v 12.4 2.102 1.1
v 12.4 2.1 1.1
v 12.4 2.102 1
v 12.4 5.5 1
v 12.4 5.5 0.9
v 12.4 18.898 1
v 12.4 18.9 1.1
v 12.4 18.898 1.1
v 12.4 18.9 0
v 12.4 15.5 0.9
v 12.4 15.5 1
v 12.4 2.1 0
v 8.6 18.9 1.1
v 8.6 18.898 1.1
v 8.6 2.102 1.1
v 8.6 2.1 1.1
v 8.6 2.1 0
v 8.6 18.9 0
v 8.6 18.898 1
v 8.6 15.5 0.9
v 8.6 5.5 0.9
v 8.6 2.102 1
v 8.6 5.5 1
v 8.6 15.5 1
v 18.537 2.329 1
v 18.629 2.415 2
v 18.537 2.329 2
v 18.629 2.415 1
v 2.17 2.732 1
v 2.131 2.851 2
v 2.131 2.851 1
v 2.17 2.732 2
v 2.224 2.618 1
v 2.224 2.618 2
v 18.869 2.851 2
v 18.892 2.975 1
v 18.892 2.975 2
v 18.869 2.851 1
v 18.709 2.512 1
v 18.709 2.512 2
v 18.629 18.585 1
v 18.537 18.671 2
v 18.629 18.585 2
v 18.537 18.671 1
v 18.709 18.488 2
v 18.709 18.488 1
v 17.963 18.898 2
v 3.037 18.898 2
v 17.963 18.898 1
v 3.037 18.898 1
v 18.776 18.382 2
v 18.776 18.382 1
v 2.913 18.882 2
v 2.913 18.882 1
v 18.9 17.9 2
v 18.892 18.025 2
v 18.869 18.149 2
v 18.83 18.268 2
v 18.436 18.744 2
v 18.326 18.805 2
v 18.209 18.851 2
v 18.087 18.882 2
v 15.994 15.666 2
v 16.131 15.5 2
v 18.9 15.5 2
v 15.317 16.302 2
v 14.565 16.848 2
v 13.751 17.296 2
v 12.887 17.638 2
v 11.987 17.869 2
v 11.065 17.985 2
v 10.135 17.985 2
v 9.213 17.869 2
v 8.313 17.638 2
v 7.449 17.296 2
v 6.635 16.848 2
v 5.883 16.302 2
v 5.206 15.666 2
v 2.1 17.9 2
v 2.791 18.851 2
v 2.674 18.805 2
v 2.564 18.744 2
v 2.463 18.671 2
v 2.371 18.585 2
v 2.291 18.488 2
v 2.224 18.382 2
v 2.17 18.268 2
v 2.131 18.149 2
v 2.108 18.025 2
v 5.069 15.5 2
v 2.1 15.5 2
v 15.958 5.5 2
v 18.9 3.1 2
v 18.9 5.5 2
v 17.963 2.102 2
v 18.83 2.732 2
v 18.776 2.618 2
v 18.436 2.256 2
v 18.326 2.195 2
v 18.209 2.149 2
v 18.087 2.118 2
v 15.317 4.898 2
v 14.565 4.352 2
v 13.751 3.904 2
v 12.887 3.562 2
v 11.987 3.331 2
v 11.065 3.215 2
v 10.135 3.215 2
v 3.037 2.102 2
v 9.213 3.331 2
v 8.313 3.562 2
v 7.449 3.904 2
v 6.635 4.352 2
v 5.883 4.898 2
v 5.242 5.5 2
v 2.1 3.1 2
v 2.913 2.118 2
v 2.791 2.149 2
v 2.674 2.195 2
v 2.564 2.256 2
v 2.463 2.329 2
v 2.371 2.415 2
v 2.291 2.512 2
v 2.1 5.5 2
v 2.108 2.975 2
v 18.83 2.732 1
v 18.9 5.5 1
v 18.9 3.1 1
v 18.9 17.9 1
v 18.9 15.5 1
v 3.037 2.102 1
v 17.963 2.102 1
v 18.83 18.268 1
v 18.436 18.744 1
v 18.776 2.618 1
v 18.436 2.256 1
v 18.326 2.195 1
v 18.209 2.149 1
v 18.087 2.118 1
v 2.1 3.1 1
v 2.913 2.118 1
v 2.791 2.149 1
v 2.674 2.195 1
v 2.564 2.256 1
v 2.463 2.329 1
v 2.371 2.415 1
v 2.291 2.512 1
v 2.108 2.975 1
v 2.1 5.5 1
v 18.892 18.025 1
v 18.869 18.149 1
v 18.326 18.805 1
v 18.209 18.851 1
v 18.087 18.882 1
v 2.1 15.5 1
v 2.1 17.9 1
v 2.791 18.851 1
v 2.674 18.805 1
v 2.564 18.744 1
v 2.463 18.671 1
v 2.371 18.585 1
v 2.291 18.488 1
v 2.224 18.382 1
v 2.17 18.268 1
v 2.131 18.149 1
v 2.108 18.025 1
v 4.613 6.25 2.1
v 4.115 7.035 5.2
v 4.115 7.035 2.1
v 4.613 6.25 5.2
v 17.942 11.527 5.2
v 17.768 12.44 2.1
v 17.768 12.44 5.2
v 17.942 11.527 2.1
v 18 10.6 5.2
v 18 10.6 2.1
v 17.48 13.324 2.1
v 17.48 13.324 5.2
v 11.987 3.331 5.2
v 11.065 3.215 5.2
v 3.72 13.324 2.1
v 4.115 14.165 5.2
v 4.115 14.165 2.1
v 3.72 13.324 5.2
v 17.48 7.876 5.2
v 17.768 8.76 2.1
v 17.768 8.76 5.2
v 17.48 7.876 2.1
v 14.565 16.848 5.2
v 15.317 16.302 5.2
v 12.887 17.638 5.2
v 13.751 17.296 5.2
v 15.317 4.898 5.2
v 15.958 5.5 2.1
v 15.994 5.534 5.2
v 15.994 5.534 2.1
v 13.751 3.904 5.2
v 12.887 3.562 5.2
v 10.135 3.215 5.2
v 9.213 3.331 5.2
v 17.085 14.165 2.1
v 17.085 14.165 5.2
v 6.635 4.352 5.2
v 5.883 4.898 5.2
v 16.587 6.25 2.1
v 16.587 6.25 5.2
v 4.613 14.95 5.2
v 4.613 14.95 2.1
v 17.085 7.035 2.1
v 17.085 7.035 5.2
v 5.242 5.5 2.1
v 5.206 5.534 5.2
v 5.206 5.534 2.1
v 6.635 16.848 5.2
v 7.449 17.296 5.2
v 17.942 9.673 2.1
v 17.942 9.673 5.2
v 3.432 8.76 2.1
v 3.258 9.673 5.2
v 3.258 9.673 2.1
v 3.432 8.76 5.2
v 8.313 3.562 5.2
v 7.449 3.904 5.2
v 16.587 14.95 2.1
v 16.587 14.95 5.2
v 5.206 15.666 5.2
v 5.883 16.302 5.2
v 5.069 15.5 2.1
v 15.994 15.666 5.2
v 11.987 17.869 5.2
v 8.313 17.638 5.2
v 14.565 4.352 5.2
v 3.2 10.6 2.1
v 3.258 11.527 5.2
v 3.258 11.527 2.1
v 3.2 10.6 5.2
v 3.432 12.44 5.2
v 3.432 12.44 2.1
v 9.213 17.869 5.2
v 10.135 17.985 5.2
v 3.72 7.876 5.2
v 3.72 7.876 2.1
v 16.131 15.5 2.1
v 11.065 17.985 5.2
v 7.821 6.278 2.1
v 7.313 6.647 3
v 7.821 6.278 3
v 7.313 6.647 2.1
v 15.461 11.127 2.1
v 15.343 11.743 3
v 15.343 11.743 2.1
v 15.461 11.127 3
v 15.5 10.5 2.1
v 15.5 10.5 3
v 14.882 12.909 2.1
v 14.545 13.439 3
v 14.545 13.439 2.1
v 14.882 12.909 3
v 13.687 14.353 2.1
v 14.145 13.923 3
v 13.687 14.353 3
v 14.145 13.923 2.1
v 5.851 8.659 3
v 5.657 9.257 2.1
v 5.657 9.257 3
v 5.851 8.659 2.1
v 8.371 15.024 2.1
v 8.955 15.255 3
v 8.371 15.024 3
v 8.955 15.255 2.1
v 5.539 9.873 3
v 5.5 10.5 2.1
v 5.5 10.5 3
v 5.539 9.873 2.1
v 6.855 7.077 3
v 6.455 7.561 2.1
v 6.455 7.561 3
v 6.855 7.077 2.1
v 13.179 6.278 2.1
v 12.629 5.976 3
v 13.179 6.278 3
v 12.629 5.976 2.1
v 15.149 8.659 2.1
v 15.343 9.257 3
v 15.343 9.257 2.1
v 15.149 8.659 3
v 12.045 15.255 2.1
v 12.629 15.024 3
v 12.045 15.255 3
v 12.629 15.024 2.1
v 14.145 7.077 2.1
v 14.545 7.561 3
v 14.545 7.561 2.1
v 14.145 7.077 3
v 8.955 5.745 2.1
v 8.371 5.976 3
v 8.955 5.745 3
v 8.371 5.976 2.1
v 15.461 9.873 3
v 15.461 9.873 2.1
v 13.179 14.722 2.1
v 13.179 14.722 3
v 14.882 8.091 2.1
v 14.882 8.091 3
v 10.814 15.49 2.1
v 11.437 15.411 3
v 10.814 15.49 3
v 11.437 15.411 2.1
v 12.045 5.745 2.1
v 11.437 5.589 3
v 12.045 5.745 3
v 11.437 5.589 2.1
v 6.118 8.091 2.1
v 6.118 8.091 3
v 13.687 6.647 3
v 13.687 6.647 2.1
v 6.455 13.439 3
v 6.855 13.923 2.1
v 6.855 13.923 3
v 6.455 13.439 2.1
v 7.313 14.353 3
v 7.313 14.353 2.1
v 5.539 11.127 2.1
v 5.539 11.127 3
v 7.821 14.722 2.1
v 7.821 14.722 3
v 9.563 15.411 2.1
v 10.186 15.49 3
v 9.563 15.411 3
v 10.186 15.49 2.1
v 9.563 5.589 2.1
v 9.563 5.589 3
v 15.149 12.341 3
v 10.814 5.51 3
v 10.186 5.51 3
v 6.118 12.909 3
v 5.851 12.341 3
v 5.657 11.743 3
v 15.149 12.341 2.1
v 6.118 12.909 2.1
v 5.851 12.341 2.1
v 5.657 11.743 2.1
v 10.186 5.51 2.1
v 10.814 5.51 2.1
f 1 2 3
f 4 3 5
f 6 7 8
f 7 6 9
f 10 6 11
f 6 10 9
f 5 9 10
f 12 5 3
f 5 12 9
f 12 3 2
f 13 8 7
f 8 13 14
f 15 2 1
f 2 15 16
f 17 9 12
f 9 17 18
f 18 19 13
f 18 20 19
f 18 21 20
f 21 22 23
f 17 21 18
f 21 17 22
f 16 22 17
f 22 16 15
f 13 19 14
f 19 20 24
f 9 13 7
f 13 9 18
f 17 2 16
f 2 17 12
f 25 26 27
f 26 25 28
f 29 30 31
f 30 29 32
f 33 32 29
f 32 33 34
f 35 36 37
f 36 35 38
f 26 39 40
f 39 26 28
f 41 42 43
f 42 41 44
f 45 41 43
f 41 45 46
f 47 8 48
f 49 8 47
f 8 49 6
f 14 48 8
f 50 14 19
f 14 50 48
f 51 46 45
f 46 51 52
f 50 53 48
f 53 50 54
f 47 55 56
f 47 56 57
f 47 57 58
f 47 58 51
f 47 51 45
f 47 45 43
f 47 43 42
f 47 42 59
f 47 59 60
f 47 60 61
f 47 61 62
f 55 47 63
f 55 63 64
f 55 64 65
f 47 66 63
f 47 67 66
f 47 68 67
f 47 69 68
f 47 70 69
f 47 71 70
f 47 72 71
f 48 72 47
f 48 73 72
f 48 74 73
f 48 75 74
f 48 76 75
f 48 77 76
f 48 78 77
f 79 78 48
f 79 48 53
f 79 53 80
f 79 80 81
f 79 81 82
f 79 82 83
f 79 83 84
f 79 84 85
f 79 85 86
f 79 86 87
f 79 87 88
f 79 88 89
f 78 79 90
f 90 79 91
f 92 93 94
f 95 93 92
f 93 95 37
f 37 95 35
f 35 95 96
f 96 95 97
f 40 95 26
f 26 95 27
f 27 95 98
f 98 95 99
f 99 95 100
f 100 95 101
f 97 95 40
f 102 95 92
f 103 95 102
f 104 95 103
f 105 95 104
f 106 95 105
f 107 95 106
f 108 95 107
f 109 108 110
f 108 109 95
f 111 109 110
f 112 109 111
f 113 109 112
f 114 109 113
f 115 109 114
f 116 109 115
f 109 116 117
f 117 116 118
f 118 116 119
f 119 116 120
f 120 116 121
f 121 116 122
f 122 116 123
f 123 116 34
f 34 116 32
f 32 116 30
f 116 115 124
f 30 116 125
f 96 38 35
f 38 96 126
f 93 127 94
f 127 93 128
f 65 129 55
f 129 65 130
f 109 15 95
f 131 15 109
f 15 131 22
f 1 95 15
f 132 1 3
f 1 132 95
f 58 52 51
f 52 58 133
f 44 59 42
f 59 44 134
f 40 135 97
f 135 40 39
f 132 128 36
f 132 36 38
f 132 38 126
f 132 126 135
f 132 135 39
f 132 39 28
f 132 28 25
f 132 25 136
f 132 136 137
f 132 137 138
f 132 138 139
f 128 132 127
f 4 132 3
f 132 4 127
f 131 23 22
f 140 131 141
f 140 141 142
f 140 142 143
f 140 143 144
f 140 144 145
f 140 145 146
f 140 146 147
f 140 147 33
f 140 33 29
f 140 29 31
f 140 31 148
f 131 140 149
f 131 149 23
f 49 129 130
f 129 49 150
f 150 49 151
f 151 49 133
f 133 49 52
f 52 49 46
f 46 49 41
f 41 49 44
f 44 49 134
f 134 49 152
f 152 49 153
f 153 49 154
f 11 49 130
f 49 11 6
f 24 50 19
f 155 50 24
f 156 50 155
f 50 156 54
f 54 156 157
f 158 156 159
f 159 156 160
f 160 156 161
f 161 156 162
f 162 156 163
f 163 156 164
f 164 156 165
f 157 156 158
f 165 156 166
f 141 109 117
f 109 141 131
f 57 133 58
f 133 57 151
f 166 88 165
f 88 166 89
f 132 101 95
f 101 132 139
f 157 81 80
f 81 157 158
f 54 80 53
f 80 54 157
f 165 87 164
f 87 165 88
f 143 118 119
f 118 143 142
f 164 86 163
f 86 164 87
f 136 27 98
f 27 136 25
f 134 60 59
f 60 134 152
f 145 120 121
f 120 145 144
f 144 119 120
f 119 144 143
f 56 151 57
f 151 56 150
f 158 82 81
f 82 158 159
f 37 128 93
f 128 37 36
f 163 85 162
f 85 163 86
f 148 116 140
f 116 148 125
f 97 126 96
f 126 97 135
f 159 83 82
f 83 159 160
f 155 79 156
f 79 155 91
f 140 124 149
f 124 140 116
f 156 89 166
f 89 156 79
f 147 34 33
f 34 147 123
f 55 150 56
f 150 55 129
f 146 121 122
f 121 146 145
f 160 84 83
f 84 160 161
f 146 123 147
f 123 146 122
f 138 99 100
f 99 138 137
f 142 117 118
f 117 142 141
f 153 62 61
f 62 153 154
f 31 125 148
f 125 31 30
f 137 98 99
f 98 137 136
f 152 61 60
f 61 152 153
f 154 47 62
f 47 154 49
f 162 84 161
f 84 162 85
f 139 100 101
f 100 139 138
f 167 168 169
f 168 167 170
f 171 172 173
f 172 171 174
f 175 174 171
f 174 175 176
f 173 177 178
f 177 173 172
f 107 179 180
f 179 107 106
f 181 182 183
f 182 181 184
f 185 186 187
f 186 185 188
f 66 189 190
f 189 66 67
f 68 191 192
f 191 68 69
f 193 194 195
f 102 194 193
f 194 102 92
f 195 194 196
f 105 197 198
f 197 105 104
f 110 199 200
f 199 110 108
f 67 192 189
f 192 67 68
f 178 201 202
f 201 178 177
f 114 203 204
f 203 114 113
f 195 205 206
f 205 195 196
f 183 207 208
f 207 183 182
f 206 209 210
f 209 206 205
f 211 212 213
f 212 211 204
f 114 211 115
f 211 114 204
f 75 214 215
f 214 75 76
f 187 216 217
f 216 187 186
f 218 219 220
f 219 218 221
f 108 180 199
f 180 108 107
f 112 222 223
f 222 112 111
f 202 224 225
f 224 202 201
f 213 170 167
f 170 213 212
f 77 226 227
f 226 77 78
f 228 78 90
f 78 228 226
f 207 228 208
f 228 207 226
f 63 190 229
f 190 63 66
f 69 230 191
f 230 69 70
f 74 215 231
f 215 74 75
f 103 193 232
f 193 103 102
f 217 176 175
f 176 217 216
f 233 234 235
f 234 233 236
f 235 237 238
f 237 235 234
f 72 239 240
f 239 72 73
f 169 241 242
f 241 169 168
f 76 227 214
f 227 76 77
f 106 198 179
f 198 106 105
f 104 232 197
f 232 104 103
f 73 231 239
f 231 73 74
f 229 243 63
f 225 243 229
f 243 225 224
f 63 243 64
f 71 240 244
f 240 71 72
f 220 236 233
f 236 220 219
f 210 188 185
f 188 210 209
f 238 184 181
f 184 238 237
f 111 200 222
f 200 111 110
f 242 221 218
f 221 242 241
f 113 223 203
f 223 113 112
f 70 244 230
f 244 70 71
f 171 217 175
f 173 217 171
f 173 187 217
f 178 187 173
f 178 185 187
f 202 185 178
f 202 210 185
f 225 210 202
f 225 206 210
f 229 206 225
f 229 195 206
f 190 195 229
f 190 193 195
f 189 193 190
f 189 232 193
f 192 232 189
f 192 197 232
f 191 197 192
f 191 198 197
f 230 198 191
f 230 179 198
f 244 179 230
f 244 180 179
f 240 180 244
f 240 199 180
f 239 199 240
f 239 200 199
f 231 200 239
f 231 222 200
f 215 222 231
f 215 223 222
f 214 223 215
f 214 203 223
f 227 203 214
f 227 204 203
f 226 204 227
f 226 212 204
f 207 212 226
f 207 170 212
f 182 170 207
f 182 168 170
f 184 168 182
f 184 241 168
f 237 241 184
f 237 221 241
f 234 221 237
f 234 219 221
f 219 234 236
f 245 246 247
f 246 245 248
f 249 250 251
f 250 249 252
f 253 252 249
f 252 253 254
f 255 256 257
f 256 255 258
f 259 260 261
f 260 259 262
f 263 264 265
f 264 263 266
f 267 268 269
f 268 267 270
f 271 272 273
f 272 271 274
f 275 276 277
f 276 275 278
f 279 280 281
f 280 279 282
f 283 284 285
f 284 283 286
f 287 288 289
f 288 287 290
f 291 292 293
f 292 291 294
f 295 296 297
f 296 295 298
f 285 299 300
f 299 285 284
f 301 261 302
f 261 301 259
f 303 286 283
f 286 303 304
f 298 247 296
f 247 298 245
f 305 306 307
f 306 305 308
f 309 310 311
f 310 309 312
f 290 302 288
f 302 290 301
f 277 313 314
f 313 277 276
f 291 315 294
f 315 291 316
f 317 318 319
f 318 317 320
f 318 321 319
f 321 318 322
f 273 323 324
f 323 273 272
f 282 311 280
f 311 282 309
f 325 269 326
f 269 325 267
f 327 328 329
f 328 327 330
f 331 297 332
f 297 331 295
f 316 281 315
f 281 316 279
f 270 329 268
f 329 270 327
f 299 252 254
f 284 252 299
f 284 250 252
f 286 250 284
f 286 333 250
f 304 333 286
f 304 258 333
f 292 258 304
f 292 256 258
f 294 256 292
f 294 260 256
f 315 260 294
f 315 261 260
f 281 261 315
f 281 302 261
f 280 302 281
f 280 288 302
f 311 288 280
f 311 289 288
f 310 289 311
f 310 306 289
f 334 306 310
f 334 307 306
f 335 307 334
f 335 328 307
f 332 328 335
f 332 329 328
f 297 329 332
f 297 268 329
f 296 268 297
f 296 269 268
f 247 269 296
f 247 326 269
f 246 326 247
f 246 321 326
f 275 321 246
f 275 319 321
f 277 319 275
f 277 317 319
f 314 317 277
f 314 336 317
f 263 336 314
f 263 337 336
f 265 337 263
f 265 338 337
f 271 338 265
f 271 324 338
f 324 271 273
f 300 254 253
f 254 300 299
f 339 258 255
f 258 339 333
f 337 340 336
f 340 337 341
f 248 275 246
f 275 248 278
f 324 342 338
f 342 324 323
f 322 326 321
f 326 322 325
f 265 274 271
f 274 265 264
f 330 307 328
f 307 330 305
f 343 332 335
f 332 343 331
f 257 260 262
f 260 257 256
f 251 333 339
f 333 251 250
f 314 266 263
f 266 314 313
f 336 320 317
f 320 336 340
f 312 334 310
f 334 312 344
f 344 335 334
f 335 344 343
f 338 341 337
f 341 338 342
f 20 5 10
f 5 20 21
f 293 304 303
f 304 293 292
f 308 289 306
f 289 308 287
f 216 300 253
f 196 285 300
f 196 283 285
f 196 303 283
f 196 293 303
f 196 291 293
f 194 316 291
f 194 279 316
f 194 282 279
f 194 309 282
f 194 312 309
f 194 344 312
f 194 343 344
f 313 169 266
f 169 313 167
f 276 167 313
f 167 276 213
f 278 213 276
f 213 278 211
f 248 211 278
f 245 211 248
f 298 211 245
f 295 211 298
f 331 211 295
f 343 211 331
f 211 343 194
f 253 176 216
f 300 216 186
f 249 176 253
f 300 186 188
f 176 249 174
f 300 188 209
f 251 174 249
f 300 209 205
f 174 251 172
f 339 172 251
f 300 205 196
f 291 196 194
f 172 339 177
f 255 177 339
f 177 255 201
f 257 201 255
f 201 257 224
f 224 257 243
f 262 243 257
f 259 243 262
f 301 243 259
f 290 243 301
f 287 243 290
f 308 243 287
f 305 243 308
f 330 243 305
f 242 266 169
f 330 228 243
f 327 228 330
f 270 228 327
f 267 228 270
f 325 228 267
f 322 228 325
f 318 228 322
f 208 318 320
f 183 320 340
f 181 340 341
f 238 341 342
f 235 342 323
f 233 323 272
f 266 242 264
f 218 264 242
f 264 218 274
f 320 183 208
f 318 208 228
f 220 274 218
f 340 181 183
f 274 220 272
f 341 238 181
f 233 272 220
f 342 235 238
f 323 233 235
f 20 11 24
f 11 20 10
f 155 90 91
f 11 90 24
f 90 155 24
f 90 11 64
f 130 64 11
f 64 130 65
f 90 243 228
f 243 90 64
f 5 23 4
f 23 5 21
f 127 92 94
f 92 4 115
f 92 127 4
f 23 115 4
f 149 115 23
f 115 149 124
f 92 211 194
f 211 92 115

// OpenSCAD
MAGNET_DIAMETER = 10;
MAGNET_HOLDER_WIDTH = 4;
SPACE_FOR_CONTACT = (MAGNET_DIAMETER - MAGNET_HOLDER_WIDTH) / 2;
MAGNET_HEIGHT = 2;
KEY_DIAMETER = 15;

TRAVEL_DISTANCE = 2;
BOTTOM_HEIGHT = 1 + MAGNET_HEIGHT + 1;
SWITCH_HEIGHT = BOTTOM_HEIGHT + TRAVEL_DISTANCE + 1 + 2;
STOPPER_WIDTH = 2;
INNER_WIDTH = KEY_DIAMETER + STOPPER_WIDTH;
HOUSING_WIDTH = 2;
KEY_WIDTH = INNER_WIDTH + HOUSING_WIDTH * 2;

MP = (KEY_WIDTH - MAGNET_DIAMETER) / 2;
TL_RADIUS = sqrt((INNER_WIDTH / 2 + 1)^2 + (INNER_WIDTH / 2)^2);

E = 0.1;
$fn=50;

*difference() {
    cube([KEY_WIDTH, KEY_WIDTH, SWITCH_HEIGHT]);

    // bottom magnet space
    translate([0, MP, 1]) cube([KEY_WIDTH, MAGNET_DIAMETER, MAGNET_HEIGHT - 1]);
    translate([MP + MAGNET_DIAMETER / 2, MP + MAGNET_DIAMETER / 2, 1]) cylinder(r=MAGNET_DIAMETER / 2, h=MAGNET_HEIGHT);

    // bottom magnet cutouts
    translate([-E, MP, -E]) cube([MP + SPACE_FOR_CONTACT + E, MAGNET_DIAMETER, MAGNET_HEIGHT + E]);
    translate([MP + MAGNET_DIAMETER - SPACE_FOR_CONTACT, MP, -E]) cube([MP + E + SPACE_FOR_CONTACT, MAGNET_DIAMETER, MAGNET_HEIGHT + E]);

    // bottom space for top magnet holder when pressed
    translate([MP + SPACE_FOR_CONTACT, HOUSING_WIDTH, BOTTOM_HEIGHT - 1 - E]) cube([MAGNET_HOLDER_WIDTH, INNER_WIDTH, 1 + 2 * E]);

    // top cutout
    translate([HOUSING_WIDTH, HOUSING_WIDTH, BOTTOM_HEIGHT]) cube([INNER_WIDTH, INNER_WIDTH, SWITCH_HEIGHT - BOTTOM_HEIGHT + E]);

    // top cutouts for top lid
    translate([HOUSING_WIDTH, -E, SWITCH_HEIGHT - 2]) cube([INNER_WIDTH, KEY_WIDTH + 2 * E, 2 + E]);
    translate([-E, HOUSING_WIDTH, SWITCH_HEIGHT - 2]) cube([KEY_WIDTH + 2 * E, INNER_WIDTH, 2 + E]);

    translate([HOUSING_WIDTH, HOUSING_WIDTH, SWITCH_HEIGHT - 2])
    intersection()
    {
      translate([-1, -1, 0]) cube([INNER_WIDTH + 2,INNER_WIDTH + 2, 1]);
      translate([INNER_WIDTH / 2, INNER_WIDTH / 2, 0]) cylinder(r=TL_RADIUS + E, h=1);
    };

    // holes for wires
    translate([-E, KEY_WIDTH / 2 - 0.5, BOTTOM_HEIGHT + 0.5]) rotate([0, 90, 0]) cylinder(r=0.5,h=HOUSING_WIDTH + 2 * E);
    translate([KEY_WIDTH - HOUSING_WIDTH - E, KEY_WIDTH / 2 - 0.5, BOTTOM_HEIGHT + 0.5]) rotate([0, 90, 0]) cylinder(r=0.5,h=HOUSING_WIDTH + 2 * E);
}

*translate([HOUSING_WIDTH, HOUSING_WIDTH, SWITCH_HEIGHT - 2])
difference() {
    intersection()
    {
      translate([-1, -1, 0]) cube([INNER_WIDTH + 2,INNER_WIDTH + 2, 1]);
      translate([INNER_WIDTH / 2, INNER_WIDTH / 2, 0]) cylinder(r=TL_RADIUS + E, h=1);
    };

    translate([STOPPER_WIDTH - 1 + KEY_DIAMETER / 2, STOPPER_WIDTH - 1 + KEY_DIAMETER / 2, -E]) cylinder(r=KEY_DIAMETER / 2, h=1 + 2 * E);
}

//translate([0, 0, SWITCH_HEIGHT - 4])
difference() {
  union() {
      translate([MP + SPACE_FOR_CONTACT + E, HOUSING_WIDTH + E, 0]) cube([MAGNET_HOLDER_WIDTH - 2 * E, INNER_WIDTH - 2 * E, 1 + E]);

      translate([HOUSING_WIDTH + 1 + E, HOUSING_WIDTH + 1 + E, 1])
      minkowski()
      {
        cube([INNER_WIDTH - 2 - 2 * E,INNER_WIDTH - 2 - 2 * E, 0.5]);
        cylinder(r=1,h=0.5);
      };

      translate([
        HOUSING_WIDTH + STOPPER_WIDTH - 1 + KEY_DIAMETER / 2 + E,
        HOUSING_WIDTH + STOPPER_WIDTH - 1 + KEY_DIAMETER / 2 + E,
        2])
      cylinder(r=KEY_DIAMETER / 2 - E, h=3 + 2 * E);
  }

  translate([MP + MAGNET_DIAMETER / 2, MP + MAGNET_DIAMETER / 2, 1 - E]) cylinder(r=MAGNET_DIAMETER / 2, h=MAGNET_HEIGHT + E);

  translate([HOUSING_WIDTH, MP, 1 - E]) cube([INNER_WIDTH, MAGNET_DIAMETER, 1 + 2 * E]);
}
